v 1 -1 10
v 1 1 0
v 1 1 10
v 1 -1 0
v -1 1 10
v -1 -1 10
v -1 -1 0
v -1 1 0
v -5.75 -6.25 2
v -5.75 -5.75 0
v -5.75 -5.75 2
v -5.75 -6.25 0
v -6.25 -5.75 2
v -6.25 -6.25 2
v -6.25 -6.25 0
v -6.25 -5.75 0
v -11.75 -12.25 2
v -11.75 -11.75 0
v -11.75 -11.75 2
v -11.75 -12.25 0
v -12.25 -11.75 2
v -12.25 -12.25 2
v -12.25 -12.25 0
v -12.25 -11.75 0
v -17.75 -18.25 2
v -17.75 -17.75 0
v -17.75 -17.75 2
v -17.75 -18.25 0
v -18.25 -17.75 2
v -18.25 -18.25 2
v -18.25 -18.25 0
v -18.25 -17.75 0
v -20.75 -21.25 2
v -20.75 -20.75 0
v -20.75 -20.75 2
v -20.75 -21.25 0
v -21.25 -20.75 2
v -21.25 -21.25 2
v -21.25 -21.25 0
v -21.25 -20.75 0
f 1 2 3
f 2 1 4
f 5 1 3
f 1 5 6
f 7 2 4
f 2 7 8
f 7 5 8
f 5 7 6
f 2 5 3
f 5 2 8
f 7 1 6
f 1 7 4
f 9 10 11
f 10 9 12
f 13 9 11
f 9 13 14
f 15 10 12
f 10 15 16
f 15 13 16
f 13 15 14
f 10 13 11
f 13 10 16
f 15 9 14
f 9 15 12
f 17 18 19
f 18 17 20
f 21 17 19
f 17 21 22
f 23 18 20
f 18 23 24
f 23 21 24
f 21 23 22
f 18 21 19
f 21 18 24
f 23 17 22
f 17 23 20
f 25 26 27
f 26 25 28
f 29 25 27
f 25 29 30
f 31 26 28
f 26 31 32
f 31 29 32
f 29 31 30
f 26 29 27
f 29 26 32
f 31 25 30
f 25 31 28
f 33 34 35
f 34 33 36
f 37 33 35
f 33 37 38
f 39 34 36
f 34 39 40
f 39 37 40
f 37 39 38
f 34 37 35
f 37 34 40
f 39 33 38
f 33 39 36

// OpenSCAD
translate([0, 0, 5]) color([0,1,0,0.9]) cube([2, 2, 10], center=true);
translate([-6, -6, 1]) color([1,0,0]) cube([0.5, 0.5, 2], center=true);
translate([-12, -12, 1]) color([1,0,0]) cube([0.5, 0.5, 2], center=true);
translate([-18, -18, 1]) color([1,0,0]) cube([0.5, 0.5, 2], center=true);
translate([-21, -21, 1]) color([1,0,0]) cube([0.5, 0.5, 2], center=true);
